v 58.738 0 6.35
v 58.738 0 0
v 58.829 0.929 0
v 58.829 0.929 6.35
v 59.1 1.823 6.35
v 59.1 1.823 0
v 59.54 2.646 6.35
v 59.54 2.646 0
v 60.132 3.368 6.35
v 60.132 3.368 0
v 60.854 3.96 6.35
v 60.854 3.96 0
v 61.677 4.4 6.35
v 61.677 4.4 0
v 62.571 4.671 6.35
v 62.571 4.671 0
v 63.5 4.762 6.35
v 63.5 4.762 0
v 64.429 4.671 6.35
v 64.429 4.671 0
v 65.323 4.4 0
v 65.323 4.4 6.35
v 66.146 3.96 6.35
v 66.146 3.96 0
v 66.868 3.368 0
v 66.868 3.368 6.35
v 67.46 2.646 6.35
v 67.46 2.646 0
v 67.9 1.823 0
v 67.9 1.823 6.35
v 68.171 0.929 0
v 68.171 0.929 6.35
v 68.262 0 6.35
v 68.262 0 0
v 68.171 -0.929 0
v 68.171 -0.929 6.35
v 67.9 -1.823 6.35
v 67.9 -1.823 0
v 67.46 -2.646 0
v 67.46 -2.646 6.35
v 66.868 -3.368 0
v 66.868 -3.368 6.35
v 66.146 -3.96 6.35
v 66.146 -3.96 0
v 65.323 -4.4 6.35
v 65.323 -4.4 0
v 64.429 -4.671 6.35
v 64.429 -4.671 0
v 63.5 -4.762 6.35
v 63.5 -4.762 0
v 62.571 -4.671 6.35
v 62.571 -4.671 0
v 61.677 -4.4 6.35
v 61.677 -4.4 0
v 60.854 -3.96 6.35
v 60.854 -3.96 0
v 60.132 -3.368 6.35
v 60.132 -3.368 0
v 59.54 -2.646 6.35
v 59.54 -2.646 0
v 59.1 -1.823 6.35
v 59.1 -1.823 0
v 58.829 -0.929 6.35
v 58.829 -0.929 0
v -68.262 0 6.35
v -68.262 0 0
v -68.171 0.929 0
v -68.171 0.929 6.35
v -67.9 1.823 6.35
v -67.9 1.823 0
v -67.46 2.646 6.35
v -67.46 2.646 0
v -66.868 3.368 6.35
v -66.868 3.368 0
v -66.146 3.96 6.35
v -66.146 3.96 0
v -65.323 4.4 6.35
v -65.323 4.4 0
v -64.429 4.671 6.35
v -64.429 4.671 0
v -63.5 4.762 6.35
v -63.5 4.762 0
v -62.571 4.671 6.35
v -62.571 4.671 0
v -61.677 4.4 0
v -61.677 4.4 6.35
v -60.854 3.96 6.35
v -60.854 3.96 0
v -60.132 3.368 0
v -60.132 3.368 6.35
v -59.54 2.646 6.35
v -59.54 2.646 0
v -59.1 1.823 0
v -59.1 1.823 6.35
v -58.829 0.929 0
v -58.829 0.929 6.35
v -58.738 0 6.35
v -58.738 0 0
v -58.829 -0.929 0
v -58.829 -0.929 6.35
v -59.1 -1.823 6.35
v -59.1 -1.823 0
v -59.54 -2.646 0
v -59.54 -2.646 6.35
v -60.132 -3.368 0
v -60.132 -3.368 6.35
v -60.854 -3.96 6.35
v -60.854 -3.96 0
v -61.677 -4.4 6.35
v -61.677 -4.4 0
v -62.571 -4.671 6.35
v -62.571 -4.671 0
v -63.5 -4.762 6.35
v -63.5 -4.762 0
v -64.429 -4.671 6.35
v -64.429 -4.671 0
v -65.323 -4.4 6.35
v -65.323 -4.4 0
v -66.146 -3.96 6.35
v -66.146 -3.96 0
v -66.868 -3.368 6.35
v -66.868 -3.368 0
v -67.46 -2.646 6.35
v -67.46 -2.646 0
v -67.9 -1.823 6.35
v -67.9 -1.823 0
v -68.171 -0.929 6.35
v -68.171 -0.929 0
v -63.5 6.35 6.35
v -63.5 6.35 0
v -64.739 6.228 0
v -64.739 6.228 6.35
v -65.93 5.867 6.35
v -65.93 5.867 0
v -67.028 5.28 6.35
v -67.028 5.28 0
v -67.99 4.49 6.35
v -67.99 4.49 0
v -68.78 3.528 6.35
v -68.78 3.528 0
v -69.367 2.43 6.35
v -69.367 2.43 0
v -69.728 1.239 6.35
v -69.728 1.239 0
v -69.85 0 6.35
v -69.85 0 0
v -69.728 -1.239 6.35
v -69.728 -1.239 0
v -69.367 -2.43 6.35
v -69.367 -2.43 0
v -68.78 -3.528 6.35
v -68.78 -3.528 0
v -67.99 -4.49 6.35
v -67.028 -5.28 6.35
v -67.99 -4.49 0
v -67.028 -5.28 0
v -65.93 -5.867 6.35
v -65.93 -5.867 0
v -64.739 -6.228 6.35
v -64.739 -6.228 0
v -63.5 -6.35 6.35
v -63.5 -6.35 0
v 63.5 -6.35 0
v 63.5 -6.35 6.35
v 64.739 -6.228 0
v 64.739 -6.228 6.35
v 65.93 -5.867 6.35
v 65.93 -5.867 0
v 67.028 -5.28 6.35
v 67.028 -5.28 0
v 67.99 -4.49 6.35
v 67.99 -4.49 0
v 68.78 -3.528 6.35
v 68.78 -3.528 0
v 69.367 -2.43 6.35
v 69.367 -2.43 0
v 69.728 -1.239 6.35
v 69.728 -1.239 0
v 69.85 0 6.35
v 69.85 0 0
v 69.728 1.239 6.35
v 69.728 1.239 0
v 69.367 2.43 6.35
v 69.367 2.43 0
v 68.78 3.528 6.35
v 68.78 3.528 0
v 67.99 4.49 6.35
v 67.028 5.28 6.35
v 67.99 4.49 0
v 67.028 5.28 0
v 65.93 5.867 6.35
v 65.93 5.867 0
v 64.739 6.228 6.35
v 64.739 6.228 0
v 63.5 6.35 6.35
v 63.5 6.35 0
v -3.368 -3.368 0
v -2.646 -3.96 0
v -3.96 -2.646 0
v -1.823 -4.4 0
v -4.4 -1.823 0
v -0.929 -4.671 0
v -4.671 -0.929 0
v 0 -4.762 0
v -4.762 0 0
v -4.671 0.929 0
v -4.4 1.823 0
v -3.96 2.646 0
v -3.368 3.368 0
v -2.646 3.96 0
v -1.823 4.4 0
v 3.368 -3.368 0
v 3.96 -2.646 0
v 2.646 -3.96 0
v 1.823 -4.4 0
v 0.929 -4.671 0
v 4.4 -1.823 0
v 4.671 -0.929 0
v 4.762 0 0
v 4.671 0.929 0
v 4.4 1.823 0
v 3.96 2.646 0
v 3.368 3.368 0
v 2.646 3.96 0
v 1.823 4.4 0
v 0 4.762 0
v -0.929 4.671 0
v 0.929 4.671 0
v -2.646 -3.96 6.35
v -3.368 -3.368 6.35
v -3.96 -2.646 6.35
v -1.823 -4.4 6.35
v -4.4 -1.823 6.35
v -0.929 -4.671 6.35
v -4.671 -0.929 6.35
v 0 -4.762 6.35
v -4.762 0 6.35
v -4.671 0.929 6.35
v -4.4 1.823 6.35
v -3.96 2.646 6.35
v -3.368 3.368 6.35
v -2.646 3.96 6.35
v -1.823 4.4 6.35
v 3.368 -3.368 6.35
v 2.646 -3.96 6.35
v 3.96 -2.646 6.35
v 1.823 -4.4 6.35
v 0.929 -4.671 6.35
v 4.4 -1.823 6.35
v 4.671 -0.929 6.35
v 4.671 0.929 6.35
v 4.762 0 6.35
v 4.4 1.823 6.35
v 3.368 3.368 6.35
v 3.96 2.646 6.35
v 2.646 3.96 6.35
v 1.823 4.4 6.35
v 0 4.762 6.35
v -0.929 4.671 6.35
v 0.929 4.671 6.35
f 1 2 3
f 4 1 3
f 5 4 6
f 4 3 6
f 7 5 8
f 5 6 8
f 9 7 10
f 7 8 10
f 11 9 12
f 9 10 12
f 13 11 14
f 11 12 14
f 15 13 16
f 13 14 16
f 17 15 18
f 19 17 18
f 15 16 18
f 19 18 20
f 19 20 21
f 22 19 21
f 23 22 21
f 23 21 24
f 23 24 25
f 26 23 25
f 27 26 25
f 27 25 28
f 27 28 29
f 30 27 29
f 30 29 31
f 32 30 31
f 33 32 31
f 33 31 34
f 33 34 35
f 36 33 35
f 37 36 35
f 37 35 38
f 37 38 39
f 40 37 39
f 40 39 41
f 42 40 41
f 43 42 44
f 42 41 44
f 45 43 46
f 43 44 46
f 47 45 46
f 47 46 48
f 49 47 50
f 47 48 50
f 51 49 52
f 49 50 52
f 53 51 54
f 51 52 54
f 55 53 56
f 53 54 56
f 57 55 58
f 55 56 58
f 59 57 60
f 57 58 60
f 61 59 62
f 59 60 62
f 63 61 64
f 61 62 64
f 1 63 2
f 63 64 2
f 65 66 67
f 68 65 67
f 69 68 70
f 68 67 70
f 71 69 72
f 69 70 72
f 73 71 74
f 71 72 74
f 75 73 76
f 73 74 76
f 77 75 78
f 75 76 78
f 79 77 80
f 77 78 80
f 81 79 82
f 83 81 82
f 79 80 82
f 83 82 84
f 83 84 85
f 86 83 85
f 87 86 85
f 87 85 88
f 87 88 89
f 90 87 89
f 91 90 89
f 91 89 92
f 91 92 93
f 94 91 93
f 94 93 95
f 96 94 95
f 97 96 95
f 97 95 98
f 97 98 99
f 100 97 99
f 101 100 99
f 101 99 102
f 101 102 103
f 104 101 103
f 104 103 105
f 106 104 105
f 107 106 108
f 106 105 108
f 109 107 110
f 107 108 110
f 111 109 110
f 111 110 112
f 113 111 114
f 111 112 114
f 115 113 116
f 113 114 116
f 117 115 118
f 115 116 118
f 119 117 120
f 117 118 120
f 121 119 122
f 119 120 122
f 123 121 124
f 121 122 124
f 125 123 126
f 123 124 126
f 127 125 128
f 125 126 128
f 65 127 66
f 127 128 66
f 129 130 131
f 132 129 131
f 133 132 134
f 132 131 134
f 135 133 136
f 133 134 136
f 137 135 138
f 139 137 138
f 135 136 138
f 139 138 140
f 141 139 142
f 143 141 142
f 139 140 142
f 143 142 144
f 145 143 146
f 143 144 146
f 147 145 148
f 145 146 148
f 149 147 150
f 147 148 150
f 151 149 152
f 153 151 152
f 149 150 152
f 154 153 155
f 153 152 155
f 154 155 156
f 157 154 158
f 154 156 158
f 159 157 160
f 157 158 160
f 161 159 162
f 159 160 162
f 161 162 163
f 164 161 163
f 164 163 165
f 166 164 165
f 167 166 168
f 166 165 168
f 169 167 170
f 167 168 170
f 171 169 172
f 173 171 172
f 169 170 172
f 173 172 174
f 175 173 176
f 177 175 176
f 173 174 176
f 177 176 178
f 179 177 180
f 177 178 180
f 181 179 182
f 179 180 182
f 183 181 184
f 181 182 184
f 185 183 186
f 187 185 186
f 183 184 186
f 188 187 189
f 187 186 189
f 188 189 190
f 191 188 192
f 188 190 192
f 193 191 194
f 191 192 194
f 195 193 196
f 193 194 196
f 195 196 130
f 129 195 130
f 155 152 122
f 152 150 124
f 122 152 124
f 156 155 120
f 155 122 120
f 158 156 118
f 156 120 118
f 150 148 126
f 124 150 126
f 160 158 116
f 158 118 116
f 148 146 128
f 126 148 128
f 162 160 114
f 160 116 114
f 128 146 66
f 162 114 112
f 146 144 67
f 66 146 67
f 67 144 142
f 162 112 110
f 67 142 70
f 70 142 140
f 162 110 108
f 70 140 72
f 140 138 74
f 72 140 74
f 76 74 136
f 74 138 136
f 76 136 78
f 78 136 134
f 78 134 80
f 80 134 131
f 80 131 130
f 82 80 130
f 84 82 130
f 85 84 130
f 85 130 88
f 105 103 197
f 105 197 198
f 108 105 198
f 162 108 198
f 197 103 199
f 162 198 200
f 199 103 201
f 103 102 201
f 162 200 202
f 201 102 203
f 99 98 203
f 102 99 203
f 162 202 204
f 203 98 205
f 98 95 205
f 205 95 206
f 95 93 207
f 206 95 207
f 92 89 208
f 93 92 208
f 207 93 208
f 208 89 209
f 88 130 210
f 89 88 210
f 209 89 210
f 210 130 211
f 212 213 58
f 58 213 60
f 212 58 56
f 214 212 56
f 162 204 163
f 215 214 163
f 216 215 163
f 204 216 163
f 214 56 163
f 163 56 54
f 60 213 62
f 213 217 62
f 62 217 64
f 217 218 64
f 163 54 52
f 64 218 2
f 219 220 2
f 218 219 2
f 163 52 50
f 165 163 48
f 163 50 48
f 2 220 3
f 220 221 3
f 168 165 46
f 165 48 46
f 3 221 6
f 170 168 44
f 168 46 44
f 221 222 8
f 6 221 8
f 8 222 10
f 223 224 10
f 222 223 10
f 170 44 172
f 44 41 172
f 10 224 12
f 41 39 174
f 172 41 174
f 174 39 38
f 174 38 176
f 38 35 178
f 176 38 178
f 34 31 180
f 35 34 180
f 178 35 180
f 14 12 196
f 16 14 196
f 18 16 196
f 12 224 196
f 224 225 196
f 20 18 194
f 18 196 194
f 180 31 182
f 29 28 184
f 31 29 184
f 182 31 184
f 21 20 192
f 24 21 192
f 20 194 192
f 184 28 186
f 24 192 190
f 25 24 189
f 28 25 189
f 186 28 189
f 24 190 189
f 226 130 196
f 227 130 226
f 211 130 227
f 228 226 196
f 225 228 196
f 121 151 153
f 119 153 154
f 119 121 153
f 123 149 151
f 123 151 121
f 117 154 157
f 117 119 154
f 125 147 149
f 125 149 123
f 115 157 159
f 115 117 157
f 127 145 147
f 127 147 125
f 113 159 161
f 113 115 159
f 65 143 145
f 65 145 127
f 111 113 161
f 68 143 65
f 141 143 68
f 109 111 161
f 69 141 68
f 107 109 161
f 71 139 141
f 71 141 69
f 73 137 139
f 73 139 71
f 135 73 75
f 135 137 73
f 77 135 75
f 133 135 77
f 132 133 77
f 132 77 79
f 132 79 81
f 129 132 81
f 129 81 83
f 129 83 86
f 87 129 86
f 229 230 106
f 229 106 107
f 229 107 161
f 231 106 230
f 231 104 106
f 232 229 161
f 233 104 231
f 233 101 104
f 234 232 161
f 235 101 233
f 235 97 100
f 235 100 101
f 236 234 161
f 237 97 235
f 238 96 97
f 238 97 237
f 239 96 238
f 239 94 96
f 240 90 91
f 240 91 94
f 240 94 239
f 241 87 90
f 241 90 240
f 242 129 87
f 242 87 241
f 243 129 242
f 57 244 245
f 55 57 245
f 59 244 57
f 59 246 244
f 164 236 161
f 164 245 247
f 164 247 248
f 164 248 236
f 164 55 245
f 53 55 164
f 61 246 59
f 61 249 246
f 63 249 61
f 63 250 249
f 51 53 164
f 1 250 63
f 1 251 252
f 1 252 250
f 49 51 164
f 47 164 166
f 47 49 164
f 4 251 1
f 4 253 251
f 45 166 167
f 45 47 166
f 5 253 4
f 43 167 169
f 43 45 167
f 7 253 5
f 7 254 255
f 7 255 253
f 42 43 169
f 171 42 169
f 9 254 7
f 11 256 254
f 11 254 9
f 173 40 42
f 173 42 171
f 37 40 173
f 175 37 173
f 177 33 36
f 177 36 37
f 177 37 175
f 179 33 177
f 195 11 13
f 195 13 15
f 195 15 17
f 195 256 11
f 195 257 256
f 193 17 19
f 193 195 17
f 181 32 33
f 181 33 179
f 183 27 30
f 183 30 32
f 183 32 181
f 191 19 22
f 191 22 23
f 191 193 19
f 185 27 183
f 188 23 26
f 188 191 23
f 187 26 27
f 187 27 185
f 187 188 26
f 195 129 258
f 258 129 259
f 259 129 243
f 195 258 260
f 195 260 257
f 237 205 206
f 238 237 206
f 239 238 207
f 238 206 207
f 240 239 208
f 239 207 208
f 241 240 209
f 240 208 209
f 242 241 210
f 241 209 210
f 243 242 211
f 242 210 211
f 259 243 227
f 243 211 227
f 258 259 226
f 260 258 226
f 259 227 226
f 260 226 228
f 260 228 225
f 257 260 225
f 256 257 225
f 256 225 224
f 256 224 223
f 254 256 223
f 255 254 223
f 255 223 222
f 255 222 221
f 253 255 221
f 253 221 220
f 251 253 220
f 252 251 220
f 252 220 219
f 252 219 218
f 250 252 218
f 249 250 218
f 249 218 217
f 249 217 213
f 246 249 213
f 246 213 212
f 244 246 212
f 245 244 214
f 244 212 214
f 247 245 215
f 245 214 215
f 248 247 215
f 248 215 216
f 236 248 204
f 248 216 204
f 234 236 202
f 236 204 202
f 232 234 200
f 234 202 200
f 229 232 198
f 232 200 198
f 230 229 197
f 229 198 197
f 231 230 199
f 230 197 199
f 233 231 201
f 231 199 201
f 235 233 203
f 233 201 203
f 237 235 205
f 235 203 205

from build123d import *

# Parameters (mm, degrees)
BOSS_EXTRUDE1_DEPTH            = 6.35
F_4_0_375_DIAMETER_HOLE1_D     = 9.525
F_4_0_375_DIAMETER_HOLE1_DEPTH = 6.35


with BuildPart() as part:
    # Sketch1 → Boss-Extrude1 (new body)
    with BuildSketch(Plane.XY):
        with BuildLine():
            Line((-63.5, -6.35), (63.5, -6.35))
            ThreePointArc((63.5, -6.35), (69.85, 0), (63.5, 6.35))
            Line((63.5, 6.35), (-63.5, 6.35))
            ThreePointArc((-63.5, 6.35), (-69.85, 0), (-63.5, -6.35))
        make_face()
    extrude(amount=BOSS_EXTRUDE1_DEPTH)

    # #4 (0.375) Diameter Hole1
    with Locations(Plane.XY.offset(6.35)):
        with Locations((0, 0), (-63.5, 0), (63.5, 0)):
            Hole(F_4_0_375_DIAMETER_HOLE1_D / 2, depth=F_4_0_375_DIAMETER_HOLE1_DEPTH)


solid = part.part
